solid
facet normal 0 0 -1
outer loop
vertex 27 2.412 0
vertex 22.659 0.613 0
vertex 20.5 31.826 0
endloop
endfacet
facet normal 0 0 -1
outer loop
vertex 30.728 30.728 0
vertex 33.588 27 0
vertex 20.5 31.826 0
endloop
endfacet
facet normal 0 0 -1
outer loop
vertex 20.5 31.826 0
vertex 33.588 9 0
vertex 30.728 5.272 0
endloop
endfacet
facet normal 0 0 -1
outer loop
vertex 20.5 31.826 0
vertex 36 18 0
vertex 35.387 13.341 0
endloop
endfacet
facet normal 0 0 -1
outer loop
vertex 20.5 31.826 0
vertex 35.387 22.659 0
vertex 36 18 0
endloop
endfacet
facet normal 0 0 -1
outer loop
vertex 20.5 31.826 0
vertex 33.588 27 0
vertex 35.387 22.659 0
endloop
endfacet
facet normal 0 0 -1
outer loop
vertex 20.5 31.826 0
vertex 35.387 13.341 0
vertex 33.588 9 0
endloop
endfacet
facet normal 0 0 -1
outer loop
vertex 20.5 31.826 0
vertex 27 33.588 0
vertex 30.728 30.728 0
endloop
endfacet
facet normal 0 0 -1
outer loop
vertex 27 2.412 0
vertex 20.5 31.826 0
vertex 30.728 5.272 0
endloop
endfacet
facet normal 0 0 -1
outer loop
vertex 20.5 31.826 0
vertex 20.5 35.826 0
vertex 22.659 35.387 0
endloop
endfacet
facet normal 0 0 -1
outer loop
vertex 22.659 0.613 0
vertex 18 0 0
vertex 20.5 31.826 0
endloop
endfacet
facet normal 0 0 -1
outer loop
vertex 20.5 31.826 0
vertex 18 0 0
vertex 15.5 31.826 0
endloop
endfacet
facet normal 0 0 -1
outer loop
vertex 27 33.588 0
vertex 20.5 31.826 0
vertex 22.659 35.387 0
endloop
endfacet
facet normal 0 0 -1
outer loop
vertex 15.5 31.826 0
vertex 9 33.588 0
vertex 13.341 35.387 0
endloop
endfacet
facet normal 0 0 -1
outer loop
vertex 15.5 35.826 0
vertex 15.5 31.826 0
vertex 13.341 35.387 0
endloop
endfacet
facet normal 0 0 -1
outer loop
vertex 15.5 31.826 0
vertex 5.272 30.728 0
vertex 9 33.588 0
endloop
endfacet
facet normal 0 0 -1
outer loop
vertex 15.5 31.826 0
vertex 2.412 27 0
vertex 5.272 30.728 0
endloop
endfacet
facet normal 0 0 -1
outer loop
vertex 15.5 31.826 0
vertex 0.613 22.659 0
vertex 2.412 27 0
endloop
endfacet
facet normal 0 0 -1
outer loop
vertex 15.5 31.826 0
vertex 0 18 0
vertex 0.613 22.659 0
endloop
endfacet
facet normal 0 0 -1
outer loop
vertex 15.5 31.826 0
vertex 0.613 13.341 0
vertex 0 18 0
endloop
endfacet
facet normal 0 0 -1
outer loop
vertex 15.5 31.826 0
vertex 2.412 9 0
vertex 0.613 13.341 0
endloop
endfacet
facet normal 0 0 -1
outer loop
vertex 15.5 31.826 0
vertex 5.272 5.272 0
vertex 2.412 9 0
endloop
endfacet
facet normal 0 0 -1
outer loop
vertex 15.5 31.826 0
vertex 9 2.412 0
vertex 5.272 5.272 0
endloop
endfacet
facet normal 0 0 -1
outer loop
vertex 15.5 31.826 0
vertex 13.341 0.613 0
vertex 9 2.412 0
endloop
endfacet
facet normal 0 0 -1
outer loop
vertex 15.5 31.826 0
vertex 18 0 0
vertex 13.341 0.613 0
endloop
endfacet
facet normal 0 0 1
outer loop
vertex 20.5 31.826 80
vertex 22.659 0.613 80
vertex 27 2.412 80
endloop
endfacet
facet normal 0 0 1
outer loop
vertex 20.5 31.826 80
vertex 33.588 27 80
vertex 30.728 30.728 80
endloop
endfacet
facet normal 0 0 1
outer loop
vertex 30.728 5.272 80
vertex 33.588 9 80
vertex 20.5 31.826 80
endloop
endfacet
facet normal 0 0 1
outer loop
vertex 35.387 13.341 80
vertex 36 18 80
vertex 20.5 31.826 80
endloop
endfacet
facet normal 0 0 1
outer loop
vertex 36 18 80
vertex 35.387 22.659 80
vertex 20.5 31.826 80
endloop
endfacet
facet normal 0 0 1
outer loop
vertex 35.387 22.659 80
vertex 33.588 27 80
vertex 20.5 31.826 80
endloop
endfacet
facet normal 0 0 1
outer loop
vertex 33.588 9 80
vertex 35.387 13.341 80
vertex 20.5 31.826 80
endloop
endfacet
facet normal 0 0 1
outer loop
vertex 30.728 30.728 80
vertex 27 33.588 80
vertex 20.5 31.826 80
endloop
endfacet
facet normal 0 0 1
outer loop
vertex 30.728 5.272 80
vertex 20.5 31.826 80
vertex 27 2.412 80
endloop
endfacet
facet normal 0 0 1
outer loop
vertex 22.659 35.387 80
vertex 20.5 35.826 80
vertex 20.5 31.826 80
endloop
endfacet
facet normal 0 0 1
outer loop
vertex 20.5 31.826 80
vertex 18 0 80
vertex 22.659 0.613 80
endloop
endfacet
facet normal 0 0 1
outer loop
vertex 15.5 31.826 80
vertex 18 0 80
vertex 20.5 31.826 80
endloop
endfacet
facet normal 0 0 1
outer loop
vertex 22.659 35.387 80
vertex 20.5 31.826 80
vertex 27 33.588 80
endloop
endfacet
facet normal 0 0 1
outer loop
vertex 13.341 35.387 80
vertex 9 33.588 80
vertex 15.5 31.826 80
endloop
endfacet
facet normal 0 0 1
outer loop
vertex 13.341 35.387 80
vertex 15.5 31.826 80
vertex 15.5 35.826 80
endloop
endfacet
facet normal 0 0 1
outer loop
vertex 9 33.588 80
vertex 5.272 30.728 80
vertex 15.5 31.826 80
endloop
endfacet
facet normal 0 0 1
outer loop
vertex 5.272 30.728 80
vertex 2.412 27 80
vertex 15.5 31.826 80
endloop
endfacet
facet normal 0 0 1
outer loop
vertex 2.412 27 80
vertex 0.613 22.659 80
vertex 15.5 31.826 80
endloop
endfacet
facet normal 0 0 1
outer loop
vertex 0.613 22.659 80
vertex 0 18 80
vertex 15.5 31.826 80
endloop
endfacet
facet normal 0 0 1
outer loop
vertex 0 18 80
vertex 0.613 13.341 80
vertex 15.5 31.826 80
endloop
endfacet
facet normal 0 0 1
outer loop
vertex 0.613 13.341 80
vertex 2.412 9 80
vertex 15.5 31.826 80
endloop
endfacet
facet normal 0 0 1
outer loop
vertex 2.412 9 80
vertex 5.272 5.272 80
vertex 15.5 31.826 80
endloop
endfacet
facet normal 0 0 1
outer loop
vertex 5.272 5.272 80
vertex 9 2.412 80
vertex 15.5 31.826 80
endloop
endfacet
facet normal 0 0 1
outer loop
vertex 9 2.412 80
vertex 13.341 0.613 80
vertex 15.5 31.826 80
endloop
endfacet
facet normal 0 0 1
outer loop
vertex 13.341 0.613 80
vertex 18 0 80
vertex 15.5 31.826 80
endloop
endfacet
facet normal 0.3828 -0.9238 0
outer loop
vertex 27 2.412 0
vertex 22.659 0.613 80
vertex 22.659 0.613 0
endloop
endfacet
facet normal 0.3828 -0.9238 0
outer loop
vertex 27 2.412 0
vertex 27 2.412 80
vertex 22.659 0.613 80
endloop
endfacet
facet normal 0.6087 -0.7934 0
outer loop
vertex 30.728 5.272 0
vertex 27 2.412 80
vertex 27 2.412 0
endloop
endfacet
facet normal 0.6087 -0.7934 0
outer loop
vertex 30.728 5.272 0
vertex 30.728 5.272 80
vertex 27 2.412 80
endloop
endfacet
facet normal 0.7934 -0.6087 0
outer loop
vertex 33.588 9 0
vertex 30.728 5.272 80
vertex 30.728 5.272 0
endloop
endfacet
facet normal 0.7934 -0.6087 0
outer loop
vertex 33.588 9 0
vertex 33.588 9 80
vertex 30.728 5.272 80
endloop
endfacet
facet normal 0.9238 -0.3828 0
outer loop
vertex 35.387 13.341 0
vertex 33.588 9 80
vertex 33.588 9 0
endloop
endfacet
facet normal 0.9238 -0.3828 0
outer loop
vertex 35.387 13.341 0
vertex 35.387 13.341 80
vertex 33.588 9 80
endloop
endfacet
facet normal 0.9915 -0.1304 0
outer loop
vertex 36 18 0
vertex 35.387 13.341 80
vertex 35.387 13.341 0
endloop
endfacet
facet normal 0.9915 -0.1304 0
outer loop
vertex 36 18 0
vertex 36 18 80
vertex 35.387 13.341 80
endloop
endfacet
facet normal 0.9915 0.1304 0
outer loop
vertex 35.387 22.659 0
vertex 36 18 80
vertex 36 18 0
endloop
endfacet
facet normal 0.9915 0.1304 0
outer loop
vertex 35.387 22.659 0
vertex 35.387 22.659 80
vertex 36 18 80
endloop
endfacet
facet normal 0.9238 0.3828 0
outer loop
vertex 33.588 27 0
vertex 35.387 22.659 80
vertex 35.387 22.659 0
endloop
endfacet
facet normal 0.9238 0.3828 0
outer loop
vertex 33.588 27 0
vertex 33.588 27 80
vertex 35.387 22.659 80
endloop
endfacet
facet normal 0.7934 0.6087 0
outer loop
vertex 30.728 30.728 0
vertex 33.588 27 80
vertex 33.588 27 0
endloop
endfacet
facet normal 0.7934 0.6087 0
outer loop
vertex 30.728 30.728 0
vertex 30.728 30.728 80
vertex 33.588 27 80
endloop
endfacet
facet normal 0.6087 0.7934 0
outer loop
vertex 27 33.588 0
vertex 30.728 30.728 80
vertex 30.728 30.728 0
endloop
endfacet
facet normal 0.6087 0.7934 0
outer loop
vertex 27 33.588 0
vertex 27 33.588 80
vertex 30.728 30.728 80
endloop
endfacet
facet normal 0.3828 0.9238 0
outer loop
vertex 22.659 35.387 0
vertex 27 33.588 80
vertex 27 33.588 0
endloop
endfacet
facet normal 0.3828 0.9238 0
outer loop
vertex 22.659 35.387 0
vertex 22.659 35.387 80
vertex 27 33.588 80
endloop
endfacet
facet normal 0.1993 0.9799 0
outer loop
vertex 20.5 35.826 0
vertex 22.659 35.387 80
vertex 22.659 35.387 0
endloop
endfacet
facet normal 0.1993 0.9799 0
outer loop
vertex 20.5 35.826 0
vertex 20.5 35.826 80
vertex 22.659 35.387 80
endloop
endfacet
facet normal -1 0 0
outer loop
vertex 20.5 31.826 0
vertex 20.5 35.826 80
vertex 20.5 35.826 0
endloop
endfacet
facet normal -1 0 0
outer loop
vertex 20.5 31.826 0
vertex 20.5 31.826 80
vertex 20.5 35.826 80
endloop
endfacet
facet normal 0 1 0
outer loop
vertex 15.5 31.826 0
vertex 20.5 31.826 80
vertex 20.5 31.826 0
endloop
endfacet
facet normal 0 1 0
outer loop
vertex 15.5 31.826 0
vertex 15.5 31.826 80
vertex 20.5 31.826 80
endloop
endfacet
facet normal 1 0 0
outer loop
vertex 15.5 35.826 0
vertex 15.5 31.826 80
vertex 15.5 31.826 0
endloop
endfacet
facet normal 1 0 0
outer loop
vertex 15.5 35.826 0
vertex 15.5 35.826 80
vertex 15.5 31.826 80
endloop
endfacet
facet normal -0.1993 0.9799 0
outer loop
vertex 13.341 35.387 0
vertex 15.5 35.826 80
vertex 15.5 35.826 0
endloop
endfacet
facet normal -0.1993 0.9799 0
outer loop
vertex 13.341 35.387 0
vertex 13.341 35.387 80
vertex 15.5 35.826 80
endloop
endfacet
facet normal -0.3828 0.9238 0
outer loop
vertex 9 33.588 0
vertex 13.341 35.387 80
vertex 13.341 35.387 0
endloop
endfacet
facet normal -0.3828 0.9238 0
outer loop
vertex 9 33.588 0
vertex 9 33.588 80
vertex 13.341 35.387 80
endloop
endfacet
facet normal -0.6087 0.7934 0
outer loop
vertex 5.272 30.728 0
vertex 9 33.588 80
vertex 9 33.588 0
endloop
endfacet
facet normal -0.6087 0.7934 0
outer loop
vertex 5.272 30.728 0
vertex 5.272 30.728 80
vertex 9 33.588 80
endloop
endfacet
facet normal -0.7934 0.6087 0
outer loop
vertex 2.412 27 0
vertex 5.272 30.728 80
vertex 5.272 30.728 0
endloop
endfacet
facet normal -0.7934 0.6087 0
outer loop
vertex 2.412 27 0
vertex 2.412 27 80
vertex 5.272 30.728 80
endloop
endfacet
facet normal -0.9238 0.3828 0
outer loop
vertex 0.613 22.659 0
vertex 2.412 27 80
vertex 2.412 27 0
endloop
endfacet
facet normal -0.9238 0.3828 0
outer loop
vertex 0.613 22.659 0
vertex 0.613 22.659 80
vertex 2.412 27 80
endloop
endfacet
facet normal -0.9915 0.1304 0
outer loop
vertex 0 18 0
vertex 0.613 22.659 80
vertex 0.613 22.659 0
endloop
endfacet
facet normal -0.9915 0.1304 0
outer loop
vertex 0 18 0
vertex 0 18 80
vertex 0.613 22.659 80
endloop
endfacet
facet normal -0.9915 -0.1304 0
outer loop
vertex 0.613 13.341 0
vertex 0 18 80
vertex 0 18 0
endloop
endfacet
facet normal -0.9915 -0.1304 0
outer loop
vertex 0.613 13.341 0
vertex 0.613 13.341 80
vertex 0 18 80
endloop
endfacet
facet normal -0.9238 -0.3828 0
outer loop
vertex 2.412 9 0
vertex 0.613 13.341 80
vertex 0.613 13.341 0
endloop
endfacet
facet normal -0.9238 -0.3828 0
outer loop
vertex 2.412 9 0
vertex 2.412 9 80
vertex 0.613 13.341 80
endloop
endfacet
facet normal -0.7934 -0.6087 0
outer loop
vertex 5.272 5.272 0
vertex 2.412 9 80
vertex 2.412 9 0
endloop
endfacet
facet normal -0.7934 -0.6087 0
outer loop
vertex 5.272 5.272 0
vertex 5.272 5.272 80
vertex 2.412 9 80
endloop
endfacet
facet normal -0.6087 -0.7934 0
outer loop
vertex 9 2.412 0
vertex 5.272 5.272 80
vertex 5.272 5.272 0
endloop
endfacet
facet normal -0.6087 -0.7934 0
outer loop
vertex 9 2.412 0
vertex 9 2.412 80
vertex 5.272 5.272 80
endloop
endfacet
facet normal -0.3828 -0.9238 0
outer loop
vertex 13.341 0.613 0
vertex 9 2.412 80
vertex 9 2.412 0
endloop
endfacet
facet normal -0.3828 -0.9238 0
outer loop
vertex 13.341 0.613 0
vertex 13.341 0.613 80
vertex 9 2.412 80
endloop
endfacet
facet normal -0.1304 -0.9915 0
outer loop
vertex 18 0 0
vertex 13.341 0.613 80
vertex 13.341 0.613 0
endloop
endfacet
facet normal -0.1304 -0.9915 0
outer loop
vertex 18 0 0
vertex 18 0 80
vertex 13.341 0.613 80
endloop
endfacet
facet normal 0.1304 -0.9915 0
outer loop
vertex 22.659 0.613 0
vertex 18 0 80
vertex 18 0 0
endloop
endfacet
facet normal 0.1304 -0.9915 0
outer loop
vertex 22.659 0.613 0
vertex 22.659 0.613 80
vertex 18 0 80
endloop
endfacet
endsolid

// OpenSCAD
$fn = 32;

// ----------------------------------------------------------------------
// Keyway shaft: d36 shaft, key 5 x 4 mm
// ----------------------------------------------------------------------

// --- parameters (mm) ---
shaft_r = 18;             // shaft radius
key_w = 5;                // keyway width
key_d = 4;                // keyway depth below the surface line
plate_t = 80;             // shaft length, Z (extrusion height)
fit_tol = 0.05;           // declared fit tolerance (prompt contract)
free_tol = 0.3;           // declared free tolerance (prompt contract)

shaft_d = 2 * shaft_r;  // shaft diameter
circle_step = 15;  // polygon sampling step, degrees

profile = [[13.341, 35.387], [9, 33.588], [5.272, 30.728], [2.412, 27], [0.613, 22.659], [0, 18], [0.613, 13.341], [2.412, 9], [5.272, 5.272], [9, 2.412], [13.341, 0.613], [18, 0], [22.659, 0.613], [27, 2.412], [30.728, 5.272], [33.588, 9], [35.387, 13.341], [36, 18], [35.387, 22.659], [33.588, 27], [30.728, 30.728], [27, 33.588], [22.659, 35.387], [20.5, 35.826], [20.5, 31.826], [15.5, 31.826], [15.5, 35.826]];  // primary outline, 27 points, counter clockwise

// --- the one profile operation ---
linear_extrude(height = plate_t) polygon(points = profile);
